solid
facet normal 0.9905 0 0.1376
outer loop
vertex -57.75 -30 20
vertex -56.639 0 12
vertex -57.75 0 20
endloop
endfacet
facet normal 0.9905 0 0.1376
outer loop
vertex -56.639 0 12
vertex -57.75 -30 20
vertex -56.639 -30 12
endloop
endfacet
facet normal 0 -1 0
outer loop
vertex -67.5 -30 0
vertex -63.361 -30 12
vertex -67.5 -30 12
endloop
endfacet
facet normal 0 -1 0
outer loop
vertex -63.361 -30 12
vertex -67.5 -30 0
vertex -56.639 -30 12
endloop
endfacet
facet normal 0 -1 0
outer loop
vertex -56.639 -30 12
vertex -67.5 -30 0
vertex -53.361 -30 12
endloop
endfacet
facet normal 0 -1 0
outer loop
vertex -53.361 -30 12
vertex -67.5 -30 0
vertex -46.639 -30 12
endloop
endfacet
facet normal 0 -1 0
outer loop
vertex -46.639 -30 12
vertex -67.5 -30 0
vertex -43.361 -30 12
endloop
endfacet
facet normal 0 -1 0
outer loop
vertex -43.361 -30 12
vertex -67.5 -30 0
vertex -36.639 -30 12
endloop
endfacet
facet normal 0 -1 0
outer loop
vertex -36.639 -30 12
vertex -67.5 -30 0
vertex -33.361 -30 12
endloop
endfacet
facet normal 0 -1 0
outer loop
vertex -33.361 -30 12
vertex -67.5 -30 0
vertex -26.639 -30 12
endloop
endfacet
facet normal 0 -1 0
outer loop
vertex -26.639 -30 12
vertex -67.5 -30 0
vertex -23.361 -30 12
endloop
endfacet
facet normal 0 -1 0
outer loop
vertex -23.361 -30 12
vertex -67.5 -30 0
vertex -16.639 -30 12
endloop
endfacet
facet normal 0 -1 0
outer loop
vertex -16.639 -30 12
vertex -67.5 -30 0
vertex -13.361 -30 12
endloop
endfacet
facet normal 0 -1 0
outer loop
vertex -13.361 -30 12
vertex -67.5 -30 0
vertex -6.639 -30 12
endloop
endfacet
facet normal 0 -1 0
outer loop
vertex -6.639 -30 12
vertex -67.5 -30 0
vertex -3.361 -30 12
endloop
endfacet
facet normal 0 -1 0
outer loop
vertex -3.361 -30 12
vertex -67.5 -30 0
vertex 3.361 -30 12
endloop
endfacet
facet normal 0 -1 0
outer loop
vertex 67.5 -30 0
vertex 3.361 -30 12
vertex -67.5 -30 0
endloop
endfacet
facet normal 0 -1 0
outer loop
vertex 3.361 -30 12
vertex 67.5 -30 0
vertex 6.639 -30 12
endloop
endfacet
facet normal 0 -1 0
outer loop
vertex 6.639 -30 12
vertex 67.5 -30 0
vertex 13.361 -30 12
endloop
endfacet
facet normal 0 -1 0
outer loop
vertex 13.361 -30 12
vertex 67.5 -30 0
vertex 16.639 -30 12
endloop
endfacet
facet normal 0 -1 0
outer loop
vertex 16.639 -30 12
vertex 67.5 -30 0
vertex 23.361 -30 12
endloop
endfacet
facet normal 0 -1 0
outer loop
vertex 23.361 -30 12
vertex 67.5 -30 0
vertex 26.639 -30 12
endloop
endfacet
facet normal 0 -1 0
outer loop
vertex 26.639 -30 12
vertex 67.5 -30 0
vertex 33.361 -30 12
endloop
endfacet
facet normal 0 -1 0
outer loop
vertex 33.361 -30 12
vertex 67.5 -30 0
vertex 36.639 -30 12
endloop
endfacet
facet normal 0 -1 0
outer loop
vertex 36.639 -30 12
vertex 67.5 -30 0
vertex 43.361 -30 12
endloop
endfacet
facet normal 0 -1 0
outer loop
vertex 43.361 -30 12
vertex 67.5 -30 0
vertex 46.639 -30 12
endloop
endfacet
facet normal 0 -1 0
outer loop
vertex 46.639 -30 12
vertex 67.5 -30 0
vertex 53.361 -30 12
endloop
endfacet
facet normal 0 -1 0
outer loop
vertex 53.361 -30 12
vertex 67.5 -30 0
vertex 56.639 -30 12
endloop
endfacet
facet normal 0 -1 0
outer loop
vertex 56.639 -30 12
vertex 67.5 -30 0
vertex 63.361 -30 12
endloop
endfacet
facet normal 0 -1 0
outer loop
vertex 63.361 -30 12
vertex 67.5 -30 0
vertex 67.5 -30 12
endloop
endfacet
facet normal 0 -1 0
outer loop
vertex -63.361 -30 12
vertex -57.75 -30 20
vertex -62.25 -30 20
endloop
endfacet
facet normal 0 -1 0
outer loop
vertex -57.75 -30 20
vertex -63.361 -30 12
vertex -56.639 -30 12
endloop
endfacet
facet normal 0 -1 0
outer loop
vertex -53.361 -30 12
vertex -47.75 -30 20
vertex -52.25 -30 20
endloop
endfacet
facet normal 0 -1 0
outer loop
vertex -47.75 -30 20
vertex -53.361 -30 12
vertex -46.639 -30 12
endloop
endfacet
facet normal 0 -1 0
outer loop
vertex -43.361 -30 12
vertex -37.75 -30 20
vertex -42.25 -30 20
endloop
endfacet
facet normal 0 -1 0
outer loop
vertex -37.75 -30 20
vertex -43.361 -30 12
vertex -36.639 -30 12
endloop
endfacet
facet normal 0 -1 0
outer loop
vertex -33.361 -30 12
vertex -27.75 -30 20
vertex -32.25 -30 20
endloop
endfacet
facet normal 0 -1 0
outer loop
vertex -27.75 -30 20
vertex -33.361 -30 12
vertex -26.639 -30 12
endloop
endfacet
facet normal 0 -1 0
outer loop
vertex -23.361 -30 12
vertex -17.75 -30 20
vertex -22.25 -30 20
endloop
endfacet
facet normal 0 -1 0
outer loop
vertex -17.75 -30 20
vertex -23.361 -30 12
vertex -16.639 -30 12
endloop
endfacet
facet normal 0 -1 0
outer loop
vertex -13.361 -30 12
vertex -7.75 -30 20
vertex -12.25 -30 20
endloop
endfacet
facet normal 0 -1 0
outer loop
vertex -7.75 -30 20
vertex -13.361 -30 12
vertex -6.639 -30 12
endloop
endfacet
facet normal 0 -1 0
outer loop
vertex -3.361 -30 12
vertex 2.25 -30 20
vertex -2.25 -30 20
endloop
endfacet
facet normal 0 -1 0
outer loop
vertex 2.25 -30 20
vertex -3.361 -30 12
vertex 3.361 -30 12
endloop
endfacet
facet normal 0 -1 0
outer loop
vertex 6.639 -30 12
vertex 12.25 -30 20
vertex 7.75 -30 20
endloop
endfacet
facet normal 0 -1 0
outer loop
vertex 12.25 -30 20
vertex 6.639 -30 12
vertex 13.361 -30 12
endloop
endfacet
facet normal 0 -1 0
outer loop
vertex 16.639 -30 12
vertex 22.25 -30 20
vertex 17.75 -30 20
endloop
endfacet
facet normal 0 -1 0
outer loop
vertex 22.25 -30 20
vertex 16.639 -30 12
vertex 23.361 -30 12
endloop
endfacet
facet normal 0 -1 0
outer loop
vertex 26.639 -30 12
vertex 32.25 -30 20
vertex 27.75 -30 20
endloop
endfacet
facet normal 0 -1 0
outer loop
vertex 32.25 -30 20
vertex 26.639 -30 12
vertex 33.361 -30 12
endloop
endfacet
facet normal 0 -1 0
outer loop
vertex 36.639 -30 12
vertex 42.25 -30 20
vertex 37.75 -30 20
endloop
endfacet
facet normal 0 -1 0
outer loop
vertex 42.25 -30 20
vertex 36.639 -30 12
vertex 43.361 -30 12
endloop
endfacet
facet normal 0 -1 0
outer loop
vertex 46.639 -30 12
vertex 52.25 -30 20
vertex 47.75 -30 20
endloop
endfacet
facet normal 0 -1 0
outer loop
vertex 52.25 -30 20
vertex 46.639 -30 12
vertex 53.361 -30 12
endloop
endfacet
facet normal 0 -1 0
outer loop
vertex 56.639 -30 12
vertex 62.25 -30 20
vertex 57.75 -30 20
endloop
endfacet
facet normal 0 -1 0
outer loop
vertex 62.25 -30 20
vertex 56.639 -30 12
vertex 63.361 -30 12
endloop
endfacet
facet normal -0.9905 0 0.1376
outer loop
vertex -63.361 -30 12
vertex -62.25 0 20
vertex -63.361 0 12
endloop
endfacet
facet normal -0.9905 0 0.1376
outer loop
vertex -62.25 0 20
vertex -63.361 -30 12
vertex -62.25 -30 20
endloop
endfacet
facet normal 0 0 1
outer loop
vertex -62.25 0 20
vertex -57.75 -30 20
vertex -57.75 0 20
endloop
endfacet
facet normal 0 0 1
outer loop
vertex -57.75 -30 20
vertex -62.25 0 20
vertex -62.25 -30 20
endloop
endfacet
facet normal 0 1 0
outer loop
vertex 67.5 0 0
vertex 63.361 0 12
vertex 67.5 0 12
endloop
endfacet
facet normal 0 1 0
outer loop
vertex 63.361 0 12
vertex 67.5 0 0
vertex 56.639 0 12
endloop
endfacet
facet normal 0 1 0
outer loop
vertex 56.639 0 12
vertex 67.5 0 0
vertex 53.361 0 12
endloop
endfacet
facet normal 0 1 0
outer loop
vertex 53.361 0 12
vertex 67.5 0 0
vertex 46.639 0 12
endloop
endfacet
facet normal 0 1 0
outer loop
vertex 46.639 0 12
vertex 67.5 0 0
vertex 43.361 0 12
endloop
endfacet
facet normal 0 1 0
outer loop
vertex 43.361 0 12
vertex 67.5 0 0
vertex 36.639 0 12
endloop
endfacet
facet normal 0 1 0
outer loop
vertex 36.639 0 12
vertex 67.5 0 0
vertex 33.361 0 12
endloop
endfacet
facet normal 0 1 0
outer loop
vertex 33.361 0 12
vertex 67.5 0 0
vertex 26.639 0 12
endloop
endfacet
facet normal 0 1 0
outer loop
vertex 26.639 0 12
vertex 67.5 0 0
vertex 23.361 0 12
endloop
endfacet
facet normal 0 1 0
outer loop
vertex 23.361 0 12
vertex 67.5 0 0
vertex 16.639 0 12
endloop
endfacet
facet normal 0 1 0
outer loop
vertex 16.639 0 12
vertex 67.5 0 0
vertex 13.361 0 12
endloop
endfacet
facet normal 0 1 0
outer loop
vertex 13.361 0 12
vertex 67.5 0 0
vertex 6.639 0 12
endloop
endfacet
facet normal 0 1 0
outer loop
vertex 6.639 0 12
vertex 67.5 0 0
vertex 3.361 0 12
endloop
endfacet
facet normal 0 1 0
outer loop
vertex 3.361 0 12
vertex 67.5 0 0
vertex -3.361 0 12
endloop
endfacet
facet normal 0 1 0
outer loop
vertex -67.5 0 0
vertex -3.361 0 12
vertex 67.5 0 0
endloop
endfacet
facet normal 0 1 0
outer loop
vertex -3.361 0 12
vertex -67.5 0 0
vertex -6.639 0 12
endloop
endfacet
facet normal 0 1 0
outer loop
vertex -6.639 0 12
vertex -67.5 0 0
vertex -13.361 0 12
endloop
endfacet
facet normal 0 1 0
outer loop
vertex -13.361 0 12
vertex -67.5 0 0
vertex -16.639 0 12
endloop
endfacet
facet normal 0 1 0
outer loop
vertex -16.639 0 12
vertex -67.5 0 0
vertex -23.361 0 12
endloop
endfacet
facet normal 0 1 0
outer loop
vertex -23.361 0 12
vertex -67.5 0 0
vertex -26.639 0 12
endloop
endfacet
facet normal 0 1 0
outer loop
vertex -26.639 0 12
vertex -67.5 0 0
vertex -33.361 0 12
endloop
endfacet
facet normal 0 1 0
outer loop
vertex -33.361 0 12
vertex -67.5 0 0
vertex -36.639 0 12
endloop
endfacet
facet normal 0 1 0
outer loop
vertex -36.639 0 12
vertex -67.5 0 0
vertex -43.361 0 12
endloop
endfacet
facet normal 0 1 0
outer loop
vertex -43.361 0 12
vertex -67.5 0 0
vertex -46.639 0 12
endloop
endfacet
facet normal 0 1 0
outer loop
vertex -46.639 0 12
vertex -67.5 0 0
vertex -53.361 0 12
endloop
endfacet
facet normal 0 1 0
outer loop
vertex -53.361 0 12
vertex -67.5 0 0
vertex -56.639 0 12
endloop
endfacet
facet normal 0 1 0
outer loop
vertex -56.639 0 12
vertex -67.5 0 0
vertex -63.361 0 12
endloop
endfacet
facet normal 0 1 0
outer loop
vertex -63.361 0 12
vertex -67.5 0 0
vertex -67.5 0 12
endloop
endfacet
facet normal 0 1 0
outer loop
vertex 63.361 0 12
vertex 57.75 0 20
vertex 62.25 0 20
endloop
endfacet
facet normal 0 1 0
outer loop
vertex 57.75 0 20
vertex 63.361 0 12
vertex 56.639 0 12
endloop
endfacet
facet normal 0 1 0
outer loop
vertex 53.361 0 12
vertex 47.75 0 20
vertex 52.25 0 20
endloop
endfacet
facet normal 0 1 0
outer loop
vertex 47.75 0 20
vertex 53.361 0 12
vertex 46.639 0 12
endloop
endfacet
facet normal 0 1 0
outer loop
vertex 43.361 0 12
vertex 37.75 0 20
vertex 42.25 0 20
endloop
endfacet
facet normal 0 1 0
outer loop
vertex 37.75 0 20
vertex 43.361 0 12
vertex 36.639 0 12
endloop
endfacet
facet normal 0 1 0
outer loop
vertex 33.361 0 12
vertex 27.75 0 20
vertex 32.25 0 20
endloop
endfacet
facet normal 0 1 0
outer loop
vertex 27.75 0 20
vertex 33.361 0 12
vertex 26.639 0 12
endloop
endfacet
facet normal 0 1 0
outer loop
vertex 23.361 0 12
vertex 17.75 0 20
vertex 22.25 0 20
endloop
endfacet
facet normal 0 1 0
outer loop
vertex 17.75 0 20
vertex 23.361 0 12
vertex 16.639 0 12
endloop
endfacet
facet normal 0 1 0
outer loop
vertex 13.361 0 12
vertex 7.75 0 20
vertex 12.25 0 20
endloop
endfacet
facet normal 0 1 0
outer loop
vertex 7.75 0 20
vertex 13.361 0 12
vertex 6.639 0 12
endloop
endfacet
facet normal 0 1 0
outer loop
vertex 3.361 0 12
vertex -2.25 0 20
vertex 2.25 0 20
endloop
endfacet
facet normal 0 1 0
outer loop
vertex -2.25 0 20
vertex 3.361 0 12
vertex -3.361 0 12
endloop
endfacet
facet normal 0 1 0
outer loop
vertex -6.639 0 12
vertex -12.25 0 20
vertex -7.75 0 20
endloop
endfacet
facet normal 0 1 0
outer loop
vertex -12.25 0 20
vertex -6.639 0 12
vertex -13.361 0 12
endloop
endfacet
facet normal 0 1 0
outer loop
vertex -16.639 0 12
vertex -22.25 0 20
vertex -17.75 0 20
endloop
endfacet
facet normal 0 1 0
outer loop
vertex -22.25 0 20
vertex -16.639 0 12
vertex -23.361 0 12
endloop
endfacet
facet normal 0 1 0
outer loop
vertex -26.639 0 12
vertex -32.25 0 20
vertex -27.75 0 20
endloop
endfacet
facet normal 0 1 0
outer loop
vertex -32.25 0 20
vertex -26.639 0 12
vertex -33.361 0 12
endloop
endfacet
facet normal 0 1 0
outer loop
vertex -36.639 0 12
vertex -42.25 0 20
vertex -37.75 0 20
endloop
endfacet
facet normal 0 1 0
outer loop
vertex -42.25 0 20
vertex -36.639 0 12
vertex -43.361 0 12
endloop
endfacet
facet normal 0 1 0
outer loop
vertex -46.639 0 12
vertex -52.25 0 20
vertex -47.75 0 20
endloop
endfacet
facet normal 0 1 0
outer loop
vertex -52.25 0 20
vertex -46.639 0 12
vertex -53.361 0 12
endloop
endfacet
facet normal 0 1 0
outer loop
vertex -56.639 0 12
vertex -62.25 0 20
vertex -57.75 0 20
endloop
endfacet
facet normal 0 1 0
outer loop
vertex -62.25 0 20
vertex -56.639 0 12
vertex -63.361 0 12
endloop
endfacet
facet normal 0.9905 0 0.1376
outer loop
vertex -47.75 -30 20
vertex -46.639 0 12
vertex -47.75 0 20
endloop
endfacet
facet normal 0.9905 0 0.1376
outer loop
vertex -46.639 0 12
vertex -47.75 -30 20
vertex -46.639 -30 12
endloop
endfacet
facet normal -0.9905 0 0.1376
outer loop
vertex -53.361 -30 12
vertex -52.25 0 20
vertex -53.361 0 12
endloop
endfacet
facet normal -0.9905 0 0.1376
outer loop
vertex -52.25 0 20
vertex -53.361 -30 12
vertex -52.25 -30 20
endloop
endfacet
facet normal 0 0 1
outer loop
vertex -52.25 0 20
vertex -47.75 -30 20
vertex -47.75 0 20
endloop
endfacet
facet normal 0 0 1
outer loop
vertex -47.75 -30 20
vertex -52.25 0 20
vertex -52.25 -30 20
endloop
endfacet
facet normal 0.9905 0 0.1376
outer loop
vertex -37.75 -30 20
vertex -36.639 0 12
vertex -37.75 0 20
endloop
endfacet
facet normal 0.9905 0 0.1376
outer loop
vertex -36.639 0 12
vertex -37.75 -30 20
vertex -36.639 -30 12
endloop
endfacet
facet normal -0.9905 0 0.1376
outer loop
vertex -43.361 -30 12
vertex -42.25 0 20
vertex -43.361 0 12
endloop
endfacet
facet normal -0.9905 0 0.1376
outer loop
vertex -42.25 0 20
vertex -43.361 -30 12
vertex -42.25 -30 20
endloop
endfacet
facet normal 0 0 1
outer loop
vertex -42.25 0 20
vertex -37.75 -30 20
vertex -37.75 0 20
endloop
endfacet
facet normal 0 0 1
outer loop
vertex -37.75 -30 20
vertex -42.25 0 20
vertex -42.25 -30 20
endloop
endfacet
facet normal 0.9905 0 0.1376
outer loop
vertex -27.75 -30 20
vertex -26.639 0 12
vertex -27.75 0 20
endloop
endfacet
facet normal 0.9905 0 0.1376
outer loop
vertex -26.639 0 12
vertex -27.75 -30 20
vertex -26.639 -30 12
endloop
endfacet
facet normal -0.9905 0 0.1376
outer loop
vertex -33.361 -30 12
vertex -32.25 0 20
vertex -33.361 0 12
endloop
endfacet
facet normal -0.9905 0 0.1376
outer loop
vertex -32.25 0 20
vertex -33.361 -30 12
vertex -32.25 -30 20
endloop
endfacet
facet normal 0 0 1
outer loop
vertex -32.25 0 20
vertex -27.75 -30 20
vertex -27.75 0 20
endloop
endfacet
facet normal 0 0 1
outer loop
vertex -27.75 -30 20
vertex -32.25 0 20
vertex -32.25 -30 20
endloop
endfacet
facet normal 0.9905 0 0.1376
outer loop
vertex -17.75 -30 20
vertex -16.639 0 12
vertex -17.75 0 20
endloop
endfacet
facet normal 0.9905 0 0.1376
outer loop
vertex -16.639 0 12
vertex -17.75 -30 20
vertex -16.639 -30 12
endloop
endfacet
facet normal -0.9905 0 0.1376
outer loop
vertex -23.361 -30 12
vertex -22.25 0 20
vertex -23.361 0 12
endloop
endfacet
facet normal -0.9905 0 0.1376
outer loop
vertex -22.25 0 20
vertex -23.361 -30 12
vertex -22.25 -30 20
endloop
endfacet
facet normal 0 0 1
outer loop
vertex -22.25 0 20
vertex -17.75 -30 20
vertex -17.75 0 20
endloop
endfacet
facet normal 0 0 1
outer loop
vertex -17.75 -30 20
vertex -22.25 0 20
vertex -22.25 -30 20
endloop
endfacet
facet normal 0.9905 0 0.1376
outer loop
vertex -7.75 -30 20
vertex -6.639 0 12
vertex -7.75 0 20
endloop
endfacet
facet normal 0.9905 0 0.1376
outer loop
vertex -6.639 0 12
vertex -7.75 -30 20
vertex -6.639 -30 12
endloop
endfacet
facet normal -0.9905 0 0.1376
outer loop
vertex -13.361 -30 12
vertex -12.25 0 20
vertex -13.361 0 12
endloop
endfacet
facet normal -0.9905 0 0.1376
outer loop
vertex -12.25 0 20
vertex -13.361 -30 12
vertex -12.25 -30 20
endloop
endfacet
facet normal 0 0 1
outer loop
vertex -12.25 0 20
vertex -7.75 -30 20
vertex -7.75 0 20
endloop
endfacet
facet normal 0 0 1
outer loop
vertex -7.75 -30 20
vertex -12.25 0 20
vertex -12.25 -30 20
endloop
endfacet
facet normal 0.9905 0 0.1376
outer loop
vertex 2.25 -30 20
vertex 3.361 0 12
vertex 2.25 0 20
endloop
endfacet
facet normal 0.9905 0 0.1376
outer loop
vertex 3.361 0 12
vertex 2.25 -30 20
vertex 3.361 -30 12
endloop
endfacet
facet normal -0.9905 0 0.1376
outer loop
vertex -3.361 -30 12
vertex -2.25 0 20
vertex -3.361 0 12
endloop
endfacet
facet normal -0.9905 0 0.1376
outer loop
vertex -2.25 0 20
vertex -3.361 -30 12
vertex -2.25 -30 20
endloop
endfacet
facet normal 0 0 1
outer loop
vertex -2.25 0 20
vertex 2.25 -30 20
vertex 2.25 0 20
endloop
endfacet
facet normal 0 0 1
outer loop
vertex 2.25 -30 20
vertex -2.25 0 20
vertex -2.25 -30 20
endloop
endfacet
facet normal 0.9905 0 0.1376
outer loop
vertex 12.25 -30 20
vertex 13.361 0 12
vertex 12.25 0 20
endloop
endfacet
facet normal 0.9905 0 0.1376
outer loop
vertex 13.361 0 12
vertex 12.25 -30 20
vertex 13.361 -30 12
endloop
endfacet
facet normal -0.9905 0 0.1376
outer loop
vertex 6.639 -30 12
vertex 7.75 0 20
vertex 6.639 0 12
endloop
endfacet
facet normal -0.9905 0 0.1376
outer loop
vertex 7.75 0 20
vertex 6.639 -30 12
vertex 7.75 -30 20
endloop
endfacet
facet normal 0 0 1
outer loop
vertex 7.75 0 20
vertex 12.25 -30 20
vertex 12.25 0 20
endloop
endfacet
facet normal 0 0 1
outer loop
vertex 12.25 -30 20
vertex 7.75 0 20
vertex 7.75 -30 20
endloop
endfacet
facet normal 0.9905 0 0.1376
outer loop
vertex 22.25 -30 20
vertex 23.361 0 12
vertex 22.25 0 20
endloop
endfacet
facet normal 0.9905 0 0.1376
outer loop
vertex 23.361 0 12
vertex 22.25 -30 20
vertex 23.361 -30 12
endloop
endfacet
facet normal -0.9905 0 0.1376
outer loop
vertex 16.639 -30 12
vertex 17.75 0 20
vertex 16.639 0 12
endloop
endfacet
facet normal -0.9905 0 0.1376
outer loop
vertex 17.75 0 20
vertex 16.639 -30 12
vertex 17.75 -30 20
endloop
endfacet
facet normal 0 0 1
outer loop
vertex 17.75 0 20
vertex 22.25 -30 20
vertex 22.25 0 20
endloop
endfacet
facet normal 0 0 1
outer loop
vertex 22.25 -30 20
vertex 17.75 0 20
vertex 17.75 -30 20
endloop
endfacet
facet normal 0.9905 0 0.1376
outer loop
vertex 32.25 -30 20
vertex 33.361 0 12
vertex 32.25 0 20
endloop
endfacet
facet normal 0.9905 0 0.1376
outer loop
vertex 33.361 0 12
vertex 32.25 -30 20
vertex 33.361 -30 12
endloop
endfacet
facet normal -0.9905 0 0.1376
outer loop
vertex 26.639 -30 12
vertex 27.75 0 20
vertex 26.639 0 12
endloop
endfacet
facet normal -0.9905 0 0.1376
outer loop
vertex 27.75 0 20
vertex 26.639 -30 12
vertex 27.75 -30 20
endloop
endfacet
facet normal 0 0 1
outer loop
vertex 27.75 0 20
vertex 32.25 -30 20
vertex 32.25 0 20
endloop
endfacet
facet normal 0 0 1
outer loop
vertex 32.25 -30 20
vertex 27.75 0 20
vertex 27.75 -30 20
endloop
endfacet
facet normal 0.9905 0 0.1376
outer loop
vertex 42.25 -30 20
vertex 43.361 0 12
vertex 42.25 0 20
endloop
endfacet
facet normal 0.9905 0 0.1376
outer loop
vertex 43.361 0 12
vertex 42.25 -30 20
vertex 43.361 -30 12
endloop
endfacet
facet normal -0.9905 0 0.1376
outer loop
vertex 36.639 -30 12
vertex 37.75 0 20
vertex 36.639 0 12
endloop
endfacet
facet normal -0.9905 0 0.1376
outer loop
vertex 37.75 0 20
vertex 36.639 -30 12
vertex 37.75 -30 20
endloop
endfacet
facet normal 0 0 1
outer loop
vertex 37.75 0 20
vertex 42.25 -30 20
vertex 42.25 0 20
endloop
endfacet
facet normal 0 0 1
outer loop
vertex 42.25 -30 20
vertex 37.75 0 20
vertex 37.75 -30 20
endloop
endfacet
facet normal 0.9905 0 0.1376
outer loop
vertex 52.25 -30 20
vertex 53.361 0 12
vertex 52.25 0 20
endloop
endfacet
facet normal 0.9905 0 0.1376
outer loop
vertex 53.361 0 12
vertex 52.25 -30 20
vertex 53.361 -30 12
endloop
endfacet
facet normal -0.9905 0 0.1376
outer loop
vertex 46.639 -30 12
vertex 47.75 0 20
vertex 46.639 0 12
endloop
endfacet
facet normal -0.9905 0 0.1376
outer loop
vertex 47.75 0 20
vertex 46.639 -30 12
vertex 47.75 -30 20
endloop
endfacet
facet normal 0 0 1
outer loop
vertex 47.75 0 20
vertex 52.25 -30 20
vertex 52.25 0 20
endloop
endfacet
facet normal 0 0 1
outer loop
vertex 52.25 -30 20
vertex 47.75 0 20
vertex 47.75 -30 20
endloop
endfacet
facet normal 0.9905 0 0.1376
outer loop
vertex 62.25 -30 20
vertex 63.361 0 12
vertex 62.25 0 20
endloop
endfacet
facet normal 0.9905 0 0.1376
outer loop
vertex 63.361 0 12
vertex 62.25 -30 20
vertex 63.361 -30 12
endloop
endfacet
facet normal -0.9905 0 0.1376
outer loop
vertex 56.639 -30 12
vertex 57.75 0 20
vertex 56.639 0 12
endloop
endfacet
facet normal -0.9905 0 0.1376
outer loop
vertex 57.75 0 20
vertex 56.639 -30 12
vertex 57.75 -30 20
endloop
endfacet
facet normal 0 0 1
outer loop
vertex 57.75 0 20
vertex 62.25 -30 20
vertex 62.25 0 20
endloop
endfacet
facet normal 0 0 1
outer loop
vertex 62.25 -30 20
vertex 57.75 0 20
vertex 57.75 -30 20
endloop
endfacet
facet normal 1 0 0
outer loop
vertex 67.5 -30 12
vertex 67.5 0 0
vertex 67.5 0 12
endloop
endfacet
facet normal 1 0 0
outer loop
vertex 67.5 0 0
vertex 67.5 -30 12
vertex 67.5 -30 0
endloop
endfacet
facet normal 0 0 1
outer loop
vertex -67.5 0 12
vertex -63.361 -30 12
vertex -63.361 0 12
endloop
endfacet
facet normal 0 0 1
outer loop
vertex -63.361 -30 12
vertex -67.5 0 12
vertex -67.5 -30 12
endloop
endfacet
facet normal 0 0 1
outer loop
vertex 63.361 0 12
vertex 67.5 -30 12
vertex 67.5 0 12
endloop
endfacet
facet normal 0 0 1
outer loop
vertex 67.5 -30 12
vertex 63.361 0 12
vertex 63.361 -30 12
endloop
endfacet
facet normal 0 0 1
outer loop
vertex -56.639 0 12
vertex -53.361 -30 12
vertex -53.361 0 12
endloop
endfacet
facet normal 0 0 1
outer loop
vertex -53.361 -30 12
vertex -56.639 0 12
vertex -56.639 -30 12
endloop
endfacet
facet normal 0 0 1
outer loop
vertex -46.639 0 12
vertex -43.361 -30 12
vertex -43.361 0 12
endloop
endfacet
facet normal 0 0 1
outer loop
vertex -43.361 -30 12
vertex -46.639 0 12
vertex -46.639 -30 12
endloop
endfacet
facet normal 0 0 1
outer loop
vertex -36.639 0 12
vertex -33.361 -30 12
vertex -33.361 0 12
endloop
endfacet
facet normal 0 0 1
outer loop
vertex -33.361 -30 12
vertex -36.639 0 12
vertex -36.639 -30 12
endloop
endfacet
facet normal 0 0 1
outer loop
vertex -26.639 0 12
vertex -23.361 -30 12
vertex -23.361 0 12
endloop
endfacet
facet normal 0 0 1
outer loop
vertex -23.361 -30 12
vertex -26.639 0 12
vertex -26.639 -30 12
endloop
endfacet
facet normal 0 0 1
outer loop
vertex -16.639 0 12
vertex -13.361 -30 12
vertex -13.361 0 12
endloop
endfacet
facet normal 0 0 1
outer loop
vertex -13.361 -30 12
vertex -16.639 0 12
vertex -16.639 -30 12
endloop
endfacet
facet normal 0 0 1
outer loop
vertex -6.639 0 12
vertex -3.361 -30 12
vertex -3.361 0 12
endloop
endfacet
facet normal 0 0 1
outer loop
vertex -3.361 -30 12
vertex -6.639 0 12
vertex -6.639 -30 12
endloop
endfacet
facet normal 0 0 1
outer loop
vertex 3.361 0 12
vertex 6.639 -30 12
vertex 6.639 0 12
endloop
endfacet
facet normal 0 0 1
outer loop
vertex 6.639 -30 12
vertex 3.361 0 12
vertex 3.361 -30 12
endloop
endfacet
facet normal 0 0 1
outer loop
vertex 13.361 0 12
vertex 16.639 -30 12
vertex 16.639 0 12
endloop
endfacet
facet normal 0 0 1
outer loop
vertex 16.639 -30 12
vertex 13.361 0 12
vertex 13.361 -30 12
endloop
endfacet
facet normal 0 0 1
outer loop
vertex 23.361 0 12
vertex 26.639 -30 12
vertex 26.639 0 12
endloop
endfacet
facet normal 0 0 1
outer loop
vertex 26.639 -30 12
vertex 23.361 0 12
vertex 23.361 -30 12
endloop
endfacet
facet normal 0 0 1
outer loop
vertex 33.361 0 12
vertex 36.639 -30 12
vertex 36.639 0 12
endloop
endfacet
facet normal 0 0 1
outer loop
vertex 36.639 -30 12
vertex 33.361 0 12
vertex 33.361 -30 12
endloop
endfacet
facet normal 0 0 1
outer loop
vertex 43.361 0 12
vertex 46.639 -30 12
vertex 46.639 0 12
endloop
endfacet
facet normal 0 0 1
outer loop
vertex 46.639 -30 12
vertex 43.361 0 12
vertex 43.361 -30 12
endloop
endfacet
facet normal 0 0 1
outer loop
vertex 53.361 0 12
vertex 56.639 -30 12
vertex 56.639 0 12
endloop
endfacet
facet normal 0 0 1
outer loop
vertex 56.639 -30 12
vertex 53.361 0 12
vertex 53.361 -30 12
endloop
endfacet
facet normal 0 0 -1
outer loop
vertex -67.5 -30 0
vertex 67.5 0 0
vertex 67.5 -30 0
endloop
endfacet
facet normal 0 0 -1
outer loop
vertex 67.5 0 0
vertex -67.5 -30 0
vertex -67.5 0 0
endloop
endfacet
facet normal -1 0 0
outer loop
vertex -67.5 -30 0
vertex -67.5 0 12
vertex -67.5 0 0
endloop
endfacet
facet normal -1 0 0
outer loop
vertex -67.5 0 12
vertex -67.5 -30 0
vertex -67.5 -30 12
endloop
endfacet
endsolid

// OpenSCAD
$fn = 32;

// ----------------------------------------------------------------------
// Toothed rack, 13 teeth
// 10 mm pitch, 8 mm teeth
// ----------------------------------------------------------------------

// --- parameters (mm) ---
bar_w = 30;     // bar width (Y)
bar_h = 12;     // bar height (Z)
teeth = 13;     // number of teeth
pitch = 10;     // tooth pitch
tooth_h = 8;    // tooth height above the bar
root_w = 7;     // tooth width at the root
crest_w = 4.5;  // tooth width at the crest

// --- derived feature positions (mm) ---
span = (teeth - 1) * pitch;  // = 120   distance between the outer teeth
bar_l = span + root_w + 8;   // = 135   bar length: teeth plus 4 mm at each end
tooth_x = -span / 2;         // = -60   X of the first tooth
height = bar_h + tooth_h;    // = 20   overall height
feature_centers = [
  [tooth_x + 0 * pitch, -bar_w / 2],
  [tooth_x + 1 * pitch, -bar_w / 2],
  [tooth_x + 2 * pitch, -bar_w / 2],
  [tooth_x + 3 * pitch, -bar_w / 2],
  [tooth_x + 4 * pitch, -bar_w / 2],
  [tooth_x + 5 * pitch, -bar_w / 2],
  [tooth_x + 6 * pitch, -bar_w / 2],
  [tooth_x + 7 * pitch, -bar_w / 2],
  [tooth_x + 8 * pitch, -bar_w / 2],
  [tooth_x + 9 * pitch, -bar_w / 2],
  [tooth_x + 10 * pitch, -bar_w / 2],
  [tooth_x + 11 * pitch, -bar_w / 2],
  [tooth_x + 12 * pitch, -bar_w / 2]
];   // tooth centre line, drives the tooth loop

// bar with a rack of teeth, one extruded trapezoium per centre
module rack_tooth() {
  linear_extrude(height = bar_w)
    polygon(points = [
      [0, 0],
      [root_w, 0],
      [root_w / 2 + crest_w / 2, tooth_h + 1],
      [root_w / 2 - crest_w / 2, tooth_h + 1]
    ]);
}

union() {
  translate([-bar_l / 2, -bar_w, 0]) cube([bar_l, bar_w, bar_h]);
  for (centre = feature_centers)
    translate([centre[0] - root_w / 2, 0, bar_h - 1]) rotate([90, 0, 0]) rack_tooth();
}
